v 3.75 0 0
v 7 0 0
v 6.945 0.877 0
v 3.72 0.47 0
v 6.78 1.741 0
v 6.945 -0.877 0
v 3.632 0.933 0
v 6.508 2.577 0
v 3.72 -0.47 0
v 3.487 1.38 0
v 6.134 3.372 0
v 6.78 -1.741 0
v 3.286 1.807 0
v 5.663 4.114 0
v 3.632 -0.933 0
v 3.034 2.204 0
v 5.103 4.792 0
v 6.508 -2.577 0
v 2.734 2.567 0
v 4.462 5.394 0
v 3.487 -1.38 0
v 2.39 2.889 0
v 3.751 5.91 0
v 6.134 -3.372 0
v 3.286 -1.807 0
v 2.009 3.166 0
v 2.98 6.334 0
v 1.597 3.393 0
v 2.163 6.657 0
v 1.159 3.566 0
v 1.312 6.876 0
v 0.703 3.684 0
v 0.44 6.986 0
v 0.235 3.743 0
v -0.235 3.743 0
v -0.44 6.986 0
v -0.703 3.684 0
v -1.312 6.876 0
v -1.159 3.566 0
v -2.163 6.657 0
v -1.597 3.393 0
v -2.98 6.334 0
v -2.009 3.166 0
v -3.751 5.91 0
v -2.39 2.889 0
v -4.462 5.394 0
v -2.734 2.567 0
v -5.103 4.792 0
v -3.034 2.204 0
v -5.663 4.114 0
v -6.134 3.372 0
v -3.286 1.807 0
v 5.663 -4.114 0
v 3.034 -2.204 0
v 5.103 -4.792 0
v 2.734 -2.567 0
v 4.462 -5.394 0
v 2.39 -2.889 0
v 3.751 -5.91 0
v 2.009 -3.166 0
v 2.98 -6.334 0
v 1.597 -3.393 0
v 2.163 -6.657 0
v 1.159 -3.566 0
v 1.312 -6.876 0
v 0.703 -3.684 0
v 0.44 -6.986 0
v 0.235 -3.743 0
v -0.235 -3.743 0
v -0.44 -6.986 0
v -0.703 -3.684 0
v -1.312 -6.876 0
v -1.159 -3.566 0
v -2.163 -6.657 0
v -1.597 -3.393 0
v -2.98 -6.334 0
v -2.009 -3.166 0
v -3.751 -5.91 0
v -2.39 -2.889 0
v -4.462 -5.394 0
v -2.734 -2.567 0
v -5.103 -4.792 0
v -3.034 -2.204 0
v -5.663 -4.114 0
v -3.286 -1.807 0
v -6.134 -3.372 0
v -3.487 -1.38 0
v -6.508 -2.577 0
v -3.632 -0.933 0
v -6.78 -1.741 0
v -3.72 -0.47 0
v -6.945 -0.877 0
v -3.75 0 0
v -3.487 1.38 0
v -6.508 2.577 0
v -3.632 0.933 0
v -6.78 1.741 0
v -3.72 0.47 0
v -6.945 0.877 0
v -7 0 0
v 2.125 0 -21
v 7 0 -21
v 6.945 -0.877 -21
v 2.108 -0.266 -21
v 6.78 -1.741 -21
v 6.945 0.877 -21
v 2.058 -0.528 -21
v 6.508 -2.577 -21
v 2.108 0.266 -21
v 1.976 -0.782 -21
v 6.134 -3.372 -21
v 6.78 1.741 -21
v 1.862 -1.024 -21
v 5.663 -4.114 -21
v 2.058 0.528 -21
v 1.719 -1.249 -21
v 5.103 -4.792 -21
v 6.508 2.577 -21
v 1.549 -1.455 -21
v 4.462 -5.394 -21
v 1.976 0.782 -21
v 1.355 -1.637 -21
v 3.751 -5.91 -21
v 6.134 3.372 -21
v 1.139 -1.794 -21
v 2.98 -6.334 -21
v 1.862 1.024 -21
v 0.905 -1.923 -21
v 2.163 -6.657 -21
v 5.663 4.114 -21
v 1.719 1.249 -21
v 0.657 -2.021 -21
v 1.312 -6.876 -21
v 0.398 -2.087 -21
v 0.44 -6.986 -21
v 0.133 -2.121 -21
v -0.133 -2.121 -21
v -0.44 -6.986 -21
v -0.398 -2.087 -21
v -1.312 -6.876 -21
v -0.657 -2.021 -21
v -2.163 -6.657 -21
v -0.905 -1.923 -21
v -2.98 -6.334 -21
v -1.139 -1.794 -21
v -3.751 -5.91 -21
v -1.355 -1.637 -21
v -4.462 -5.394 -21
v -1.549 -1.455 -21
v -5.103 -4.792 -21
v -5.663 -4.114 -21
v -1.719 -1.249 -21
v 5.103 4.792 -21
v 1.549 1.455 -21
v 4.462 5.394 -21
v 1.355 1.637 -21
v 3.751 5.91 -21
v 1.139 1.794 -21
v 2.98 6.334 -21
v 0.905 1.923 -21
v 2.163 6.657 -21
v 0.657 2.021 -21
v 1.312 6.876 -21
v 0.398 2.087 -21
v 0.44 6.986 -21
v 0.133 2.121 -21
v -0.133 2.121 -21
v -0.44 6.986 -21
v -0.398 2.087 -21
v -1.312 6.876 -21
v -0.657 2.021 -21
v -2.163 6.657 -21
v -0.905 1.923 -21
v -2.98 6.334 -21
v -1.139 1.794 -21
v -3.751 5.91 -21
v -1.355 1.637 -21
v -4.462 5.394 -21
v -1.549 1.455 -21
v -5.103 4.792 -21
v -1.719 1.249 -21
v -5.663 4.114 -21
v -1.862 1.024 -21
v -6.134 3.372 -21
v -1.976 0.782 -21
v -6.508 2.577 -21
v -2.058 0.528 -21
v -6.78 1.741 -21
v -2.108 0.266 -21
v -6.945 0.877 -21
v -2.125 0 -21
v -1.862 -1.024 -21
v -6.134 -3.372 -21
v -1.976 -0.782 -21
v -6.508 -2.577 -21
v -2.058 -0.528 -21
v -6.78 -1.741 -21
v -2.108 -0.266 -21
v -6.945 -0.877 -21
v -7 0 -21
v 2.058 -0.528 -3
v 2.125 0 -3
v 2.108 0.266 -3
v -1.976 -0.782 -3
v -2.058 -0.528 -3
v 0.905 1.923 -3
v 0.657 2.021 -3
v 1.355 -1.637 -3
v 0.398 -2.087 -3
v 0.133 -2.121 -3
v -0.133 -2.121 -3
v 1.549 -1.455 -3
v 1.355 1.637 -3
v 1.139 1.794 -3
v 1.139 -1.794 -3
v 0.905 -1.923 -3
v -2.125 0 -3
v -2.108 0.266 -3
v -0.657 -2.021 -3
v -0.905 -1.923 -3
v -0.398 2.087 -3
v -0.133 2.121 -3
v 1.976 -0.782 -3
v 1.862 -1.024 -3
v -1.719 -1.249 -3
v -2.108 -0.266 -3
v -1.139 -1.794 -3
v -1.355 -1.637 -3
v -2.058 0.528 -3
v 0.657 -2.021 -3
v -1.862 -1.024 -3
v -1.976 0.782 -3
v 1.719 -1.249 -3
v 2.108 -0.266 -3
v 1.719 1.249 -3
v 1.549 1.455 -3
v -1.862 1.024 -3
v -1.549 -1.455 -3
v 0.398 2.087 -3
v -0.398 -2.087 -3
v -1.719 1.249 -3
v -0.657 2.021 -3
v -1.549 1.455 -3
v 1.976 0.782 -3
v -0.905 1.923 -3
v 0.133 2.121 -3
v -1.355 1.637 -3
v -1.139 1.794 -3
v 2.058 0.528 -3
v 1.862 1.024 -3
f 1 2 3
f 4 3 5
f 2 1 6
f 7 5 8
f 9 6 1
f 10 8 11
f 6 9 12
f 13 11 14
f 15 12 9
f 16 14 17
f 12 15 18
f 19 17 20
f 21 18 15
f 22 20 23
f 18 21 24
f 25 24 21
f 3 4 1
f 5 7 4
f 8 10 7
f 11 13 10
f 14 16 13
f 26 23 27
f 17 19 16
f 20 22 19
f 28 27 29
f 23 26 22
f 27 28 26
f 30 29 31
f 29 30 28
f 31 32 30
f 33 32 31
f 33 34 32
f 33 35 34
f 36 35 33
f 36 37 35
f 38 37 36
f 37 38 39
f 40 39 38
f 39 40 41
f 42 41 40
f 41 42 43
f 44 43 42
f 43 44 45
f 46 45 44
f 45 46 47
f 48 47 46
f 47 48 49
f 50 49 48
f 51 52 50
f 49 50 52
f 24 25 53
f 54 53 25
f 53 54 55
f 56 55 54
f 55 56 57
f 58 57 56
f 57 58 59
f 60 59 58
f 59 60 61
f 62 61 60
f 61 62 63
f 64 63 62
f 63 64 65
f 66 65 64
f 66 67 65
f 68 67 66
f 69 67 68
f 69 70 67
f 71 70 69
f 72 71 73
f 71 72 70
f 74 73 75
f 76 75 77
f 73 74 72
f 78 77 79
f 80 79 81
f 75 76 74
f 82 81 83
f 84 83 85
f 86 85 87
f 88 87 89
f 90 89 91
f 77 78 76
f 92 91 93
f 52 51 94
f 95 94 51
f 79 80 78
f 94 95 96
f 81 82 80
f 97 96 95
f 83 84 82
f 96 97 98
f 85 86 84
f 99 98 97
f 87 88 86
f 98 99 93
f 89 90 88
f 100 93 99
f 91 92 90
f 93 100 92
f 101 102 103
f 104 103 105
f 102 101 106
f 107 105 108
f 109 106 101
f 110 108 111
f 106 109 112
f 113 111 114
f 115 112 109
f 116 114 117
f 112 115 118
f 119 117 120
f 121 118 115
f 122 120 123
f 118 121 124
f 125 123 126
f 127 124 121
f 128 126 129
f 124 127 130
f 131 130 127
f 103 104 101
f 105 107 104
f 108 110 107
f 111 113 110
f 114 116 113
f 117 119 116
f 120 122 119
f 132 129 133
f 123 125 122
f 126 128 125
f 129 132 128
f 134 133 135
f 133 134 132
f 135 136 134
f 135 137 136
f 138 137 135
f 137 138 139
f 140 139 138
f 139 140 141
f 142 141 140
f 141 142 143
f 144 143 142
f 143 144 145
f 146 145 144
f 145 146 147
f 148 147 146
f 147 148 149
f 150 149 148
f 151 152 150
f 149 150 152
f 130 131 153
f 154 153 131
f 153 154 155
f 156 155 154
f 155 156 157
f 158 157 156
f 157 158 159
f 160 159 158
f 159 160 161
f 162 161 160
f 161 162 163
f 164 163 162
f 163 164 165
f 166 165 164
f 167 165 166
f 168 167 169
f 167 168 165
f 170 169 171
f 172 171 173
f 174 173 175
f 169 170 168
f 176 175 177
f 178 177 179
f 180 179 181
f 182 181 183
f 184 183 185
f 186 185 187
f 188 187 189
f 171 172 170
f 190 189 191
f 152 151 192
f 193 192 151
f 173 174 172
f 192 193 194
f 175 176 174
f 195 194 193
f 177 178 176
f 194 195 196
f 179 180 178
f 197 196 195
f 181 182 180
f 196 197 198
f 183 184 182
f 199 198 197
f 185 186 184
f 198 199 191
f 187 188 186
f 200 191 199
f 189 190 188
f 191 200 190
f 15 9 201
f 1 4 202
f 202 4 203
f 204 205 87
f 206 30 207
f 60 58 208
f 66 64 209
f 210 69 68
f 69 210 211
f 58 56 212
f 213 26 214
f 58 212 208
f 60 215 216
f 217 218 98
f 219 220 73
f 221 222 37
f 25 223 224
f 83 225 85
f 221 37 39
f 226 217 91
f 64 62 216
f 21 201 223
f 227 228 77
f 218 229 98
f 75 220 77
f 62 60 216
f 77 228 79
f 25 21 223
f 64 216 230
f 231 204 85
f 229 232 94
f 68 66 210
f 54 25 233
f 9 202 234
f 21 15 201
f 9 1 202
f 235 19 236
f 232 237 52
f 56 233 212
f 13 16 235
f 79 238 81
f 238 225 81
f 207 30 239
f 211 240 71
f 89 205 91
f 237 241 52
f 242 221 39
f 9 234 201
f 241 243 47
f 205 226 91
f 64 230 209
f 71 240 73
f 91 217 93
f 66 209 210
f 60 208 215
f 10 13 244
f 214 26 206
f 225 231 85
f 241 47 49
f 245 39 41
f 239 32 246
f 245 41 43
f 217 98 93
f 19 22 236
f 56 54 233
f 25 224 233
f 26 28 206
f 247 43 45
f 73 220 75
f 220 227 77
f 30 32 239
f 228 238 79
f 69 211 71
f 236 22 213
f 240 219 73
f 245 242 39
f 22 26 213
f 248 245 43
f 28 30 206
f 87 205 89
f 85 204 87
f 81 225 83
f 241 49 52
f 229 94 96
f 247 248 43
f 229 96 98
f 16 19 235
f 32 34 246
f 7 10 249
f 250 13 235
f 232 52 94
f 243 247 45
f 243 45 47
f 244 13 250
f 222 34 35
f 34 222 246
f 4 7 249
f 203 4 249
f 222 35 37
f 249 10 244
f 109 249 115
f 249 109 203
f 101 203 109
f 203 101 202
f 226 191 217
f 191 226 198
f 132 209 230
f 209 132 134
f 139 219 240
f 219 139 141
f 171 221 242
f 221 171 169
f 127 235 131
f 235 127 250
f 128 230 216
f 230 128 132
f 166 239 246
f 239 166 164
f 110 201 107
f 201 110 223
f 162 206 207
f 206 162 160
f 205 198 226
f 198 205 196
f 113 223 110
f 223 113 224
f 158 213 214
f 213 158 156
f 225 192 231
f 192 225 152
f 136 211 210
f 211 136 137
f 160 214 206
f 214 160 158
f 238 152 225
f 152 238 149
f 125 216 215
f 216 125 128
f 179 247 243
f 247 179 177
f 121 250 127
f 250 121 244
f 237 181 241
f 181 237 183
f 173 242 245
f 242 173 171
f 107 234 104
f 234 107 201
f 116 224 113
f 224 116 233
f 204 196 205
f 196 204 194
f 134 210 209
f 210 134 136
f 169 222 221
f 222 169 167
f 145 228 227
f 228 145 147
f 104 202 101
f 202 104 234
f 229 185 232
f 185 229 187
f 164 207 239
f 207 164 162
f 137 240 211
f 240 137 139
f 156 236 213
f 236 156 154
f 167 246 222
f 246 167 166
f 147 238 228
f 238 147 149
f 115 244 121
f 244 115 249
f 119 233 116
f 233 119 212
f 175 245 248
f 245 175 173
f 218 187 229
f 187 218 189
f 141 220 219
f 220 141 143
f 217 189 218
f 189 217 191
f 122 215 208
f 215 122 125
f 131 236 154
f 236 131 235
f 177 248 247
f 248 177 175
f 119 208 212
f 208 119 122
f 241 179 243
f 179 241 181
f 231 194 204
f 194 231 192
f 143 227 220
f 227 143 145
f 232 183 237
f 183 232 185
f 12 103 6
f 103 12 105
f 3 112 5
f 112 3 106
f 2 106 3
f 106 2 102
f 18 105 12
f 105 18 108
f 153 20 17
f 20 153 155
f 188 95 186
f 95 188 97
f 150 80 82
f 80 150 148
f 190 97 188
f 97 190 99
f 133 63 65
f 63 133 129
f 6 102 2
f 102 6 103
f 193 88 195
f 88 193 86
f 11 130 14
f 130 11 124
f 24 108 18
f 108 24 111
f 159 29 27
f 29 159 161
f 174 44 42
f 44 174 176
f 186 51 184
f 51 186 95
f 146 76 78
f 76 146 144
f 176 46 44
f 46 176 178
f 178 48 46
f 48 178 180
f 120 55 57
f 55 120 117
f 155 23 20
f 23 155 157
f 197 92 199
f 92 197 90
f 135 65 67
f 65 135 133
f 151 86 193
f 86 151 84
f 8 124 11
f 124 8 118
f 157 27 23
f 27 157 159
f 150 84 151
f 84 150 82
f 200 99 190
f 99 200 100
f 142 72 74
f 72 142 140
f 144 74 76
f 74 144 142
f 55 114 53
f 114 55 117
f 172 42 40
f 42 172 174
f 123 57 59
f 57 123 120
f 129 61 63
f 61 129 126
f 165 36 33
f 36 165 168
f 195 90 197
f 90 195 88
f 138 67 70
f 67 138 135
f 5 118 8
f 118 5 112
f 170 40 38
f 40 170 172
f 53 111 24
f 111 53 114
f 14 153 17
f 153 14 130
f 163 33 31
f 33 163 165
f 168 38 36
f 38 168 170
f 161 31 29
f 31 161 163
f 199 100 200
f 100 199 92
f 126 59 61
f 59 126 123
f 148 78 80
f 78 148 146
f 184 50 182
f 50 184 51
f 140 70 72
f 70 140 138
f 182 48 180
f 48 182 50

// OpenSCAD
$fn = 50;


difference() {
	union() {
		translate(v = [0, 0, -21.0000000000]) {
			cylinder(h = 21, r = 7.0000000000);
		}
		cylinder(h = 0, r = 10.0000000000);
	}
	union() {
		translate(v = [0, 0, 0]) {
			rotate(a = [0, 0, 0]) {
				difference() {
					union() {
						#translate(v = [0, 0, -21.0000000000]) {
							cylinder(h = 21, r = 2.0000000000);
						}
						#translate(v = [0, 0, -3]) {
							cylinder(h = 3, r1 = 2.1250000000, r2 = 3.7500000000);
						}
						#translate(v = [0, 0, -21.0000000000]) {
							cylinder(h = 21, r = 2.1250000000);
						}
						#translate(v = [0, 0, -21.0000000000]) {
							cylinder(h = 21, r = 2.0000000000);
						}
					}
					union();
				}
			}
		}
	}
}
